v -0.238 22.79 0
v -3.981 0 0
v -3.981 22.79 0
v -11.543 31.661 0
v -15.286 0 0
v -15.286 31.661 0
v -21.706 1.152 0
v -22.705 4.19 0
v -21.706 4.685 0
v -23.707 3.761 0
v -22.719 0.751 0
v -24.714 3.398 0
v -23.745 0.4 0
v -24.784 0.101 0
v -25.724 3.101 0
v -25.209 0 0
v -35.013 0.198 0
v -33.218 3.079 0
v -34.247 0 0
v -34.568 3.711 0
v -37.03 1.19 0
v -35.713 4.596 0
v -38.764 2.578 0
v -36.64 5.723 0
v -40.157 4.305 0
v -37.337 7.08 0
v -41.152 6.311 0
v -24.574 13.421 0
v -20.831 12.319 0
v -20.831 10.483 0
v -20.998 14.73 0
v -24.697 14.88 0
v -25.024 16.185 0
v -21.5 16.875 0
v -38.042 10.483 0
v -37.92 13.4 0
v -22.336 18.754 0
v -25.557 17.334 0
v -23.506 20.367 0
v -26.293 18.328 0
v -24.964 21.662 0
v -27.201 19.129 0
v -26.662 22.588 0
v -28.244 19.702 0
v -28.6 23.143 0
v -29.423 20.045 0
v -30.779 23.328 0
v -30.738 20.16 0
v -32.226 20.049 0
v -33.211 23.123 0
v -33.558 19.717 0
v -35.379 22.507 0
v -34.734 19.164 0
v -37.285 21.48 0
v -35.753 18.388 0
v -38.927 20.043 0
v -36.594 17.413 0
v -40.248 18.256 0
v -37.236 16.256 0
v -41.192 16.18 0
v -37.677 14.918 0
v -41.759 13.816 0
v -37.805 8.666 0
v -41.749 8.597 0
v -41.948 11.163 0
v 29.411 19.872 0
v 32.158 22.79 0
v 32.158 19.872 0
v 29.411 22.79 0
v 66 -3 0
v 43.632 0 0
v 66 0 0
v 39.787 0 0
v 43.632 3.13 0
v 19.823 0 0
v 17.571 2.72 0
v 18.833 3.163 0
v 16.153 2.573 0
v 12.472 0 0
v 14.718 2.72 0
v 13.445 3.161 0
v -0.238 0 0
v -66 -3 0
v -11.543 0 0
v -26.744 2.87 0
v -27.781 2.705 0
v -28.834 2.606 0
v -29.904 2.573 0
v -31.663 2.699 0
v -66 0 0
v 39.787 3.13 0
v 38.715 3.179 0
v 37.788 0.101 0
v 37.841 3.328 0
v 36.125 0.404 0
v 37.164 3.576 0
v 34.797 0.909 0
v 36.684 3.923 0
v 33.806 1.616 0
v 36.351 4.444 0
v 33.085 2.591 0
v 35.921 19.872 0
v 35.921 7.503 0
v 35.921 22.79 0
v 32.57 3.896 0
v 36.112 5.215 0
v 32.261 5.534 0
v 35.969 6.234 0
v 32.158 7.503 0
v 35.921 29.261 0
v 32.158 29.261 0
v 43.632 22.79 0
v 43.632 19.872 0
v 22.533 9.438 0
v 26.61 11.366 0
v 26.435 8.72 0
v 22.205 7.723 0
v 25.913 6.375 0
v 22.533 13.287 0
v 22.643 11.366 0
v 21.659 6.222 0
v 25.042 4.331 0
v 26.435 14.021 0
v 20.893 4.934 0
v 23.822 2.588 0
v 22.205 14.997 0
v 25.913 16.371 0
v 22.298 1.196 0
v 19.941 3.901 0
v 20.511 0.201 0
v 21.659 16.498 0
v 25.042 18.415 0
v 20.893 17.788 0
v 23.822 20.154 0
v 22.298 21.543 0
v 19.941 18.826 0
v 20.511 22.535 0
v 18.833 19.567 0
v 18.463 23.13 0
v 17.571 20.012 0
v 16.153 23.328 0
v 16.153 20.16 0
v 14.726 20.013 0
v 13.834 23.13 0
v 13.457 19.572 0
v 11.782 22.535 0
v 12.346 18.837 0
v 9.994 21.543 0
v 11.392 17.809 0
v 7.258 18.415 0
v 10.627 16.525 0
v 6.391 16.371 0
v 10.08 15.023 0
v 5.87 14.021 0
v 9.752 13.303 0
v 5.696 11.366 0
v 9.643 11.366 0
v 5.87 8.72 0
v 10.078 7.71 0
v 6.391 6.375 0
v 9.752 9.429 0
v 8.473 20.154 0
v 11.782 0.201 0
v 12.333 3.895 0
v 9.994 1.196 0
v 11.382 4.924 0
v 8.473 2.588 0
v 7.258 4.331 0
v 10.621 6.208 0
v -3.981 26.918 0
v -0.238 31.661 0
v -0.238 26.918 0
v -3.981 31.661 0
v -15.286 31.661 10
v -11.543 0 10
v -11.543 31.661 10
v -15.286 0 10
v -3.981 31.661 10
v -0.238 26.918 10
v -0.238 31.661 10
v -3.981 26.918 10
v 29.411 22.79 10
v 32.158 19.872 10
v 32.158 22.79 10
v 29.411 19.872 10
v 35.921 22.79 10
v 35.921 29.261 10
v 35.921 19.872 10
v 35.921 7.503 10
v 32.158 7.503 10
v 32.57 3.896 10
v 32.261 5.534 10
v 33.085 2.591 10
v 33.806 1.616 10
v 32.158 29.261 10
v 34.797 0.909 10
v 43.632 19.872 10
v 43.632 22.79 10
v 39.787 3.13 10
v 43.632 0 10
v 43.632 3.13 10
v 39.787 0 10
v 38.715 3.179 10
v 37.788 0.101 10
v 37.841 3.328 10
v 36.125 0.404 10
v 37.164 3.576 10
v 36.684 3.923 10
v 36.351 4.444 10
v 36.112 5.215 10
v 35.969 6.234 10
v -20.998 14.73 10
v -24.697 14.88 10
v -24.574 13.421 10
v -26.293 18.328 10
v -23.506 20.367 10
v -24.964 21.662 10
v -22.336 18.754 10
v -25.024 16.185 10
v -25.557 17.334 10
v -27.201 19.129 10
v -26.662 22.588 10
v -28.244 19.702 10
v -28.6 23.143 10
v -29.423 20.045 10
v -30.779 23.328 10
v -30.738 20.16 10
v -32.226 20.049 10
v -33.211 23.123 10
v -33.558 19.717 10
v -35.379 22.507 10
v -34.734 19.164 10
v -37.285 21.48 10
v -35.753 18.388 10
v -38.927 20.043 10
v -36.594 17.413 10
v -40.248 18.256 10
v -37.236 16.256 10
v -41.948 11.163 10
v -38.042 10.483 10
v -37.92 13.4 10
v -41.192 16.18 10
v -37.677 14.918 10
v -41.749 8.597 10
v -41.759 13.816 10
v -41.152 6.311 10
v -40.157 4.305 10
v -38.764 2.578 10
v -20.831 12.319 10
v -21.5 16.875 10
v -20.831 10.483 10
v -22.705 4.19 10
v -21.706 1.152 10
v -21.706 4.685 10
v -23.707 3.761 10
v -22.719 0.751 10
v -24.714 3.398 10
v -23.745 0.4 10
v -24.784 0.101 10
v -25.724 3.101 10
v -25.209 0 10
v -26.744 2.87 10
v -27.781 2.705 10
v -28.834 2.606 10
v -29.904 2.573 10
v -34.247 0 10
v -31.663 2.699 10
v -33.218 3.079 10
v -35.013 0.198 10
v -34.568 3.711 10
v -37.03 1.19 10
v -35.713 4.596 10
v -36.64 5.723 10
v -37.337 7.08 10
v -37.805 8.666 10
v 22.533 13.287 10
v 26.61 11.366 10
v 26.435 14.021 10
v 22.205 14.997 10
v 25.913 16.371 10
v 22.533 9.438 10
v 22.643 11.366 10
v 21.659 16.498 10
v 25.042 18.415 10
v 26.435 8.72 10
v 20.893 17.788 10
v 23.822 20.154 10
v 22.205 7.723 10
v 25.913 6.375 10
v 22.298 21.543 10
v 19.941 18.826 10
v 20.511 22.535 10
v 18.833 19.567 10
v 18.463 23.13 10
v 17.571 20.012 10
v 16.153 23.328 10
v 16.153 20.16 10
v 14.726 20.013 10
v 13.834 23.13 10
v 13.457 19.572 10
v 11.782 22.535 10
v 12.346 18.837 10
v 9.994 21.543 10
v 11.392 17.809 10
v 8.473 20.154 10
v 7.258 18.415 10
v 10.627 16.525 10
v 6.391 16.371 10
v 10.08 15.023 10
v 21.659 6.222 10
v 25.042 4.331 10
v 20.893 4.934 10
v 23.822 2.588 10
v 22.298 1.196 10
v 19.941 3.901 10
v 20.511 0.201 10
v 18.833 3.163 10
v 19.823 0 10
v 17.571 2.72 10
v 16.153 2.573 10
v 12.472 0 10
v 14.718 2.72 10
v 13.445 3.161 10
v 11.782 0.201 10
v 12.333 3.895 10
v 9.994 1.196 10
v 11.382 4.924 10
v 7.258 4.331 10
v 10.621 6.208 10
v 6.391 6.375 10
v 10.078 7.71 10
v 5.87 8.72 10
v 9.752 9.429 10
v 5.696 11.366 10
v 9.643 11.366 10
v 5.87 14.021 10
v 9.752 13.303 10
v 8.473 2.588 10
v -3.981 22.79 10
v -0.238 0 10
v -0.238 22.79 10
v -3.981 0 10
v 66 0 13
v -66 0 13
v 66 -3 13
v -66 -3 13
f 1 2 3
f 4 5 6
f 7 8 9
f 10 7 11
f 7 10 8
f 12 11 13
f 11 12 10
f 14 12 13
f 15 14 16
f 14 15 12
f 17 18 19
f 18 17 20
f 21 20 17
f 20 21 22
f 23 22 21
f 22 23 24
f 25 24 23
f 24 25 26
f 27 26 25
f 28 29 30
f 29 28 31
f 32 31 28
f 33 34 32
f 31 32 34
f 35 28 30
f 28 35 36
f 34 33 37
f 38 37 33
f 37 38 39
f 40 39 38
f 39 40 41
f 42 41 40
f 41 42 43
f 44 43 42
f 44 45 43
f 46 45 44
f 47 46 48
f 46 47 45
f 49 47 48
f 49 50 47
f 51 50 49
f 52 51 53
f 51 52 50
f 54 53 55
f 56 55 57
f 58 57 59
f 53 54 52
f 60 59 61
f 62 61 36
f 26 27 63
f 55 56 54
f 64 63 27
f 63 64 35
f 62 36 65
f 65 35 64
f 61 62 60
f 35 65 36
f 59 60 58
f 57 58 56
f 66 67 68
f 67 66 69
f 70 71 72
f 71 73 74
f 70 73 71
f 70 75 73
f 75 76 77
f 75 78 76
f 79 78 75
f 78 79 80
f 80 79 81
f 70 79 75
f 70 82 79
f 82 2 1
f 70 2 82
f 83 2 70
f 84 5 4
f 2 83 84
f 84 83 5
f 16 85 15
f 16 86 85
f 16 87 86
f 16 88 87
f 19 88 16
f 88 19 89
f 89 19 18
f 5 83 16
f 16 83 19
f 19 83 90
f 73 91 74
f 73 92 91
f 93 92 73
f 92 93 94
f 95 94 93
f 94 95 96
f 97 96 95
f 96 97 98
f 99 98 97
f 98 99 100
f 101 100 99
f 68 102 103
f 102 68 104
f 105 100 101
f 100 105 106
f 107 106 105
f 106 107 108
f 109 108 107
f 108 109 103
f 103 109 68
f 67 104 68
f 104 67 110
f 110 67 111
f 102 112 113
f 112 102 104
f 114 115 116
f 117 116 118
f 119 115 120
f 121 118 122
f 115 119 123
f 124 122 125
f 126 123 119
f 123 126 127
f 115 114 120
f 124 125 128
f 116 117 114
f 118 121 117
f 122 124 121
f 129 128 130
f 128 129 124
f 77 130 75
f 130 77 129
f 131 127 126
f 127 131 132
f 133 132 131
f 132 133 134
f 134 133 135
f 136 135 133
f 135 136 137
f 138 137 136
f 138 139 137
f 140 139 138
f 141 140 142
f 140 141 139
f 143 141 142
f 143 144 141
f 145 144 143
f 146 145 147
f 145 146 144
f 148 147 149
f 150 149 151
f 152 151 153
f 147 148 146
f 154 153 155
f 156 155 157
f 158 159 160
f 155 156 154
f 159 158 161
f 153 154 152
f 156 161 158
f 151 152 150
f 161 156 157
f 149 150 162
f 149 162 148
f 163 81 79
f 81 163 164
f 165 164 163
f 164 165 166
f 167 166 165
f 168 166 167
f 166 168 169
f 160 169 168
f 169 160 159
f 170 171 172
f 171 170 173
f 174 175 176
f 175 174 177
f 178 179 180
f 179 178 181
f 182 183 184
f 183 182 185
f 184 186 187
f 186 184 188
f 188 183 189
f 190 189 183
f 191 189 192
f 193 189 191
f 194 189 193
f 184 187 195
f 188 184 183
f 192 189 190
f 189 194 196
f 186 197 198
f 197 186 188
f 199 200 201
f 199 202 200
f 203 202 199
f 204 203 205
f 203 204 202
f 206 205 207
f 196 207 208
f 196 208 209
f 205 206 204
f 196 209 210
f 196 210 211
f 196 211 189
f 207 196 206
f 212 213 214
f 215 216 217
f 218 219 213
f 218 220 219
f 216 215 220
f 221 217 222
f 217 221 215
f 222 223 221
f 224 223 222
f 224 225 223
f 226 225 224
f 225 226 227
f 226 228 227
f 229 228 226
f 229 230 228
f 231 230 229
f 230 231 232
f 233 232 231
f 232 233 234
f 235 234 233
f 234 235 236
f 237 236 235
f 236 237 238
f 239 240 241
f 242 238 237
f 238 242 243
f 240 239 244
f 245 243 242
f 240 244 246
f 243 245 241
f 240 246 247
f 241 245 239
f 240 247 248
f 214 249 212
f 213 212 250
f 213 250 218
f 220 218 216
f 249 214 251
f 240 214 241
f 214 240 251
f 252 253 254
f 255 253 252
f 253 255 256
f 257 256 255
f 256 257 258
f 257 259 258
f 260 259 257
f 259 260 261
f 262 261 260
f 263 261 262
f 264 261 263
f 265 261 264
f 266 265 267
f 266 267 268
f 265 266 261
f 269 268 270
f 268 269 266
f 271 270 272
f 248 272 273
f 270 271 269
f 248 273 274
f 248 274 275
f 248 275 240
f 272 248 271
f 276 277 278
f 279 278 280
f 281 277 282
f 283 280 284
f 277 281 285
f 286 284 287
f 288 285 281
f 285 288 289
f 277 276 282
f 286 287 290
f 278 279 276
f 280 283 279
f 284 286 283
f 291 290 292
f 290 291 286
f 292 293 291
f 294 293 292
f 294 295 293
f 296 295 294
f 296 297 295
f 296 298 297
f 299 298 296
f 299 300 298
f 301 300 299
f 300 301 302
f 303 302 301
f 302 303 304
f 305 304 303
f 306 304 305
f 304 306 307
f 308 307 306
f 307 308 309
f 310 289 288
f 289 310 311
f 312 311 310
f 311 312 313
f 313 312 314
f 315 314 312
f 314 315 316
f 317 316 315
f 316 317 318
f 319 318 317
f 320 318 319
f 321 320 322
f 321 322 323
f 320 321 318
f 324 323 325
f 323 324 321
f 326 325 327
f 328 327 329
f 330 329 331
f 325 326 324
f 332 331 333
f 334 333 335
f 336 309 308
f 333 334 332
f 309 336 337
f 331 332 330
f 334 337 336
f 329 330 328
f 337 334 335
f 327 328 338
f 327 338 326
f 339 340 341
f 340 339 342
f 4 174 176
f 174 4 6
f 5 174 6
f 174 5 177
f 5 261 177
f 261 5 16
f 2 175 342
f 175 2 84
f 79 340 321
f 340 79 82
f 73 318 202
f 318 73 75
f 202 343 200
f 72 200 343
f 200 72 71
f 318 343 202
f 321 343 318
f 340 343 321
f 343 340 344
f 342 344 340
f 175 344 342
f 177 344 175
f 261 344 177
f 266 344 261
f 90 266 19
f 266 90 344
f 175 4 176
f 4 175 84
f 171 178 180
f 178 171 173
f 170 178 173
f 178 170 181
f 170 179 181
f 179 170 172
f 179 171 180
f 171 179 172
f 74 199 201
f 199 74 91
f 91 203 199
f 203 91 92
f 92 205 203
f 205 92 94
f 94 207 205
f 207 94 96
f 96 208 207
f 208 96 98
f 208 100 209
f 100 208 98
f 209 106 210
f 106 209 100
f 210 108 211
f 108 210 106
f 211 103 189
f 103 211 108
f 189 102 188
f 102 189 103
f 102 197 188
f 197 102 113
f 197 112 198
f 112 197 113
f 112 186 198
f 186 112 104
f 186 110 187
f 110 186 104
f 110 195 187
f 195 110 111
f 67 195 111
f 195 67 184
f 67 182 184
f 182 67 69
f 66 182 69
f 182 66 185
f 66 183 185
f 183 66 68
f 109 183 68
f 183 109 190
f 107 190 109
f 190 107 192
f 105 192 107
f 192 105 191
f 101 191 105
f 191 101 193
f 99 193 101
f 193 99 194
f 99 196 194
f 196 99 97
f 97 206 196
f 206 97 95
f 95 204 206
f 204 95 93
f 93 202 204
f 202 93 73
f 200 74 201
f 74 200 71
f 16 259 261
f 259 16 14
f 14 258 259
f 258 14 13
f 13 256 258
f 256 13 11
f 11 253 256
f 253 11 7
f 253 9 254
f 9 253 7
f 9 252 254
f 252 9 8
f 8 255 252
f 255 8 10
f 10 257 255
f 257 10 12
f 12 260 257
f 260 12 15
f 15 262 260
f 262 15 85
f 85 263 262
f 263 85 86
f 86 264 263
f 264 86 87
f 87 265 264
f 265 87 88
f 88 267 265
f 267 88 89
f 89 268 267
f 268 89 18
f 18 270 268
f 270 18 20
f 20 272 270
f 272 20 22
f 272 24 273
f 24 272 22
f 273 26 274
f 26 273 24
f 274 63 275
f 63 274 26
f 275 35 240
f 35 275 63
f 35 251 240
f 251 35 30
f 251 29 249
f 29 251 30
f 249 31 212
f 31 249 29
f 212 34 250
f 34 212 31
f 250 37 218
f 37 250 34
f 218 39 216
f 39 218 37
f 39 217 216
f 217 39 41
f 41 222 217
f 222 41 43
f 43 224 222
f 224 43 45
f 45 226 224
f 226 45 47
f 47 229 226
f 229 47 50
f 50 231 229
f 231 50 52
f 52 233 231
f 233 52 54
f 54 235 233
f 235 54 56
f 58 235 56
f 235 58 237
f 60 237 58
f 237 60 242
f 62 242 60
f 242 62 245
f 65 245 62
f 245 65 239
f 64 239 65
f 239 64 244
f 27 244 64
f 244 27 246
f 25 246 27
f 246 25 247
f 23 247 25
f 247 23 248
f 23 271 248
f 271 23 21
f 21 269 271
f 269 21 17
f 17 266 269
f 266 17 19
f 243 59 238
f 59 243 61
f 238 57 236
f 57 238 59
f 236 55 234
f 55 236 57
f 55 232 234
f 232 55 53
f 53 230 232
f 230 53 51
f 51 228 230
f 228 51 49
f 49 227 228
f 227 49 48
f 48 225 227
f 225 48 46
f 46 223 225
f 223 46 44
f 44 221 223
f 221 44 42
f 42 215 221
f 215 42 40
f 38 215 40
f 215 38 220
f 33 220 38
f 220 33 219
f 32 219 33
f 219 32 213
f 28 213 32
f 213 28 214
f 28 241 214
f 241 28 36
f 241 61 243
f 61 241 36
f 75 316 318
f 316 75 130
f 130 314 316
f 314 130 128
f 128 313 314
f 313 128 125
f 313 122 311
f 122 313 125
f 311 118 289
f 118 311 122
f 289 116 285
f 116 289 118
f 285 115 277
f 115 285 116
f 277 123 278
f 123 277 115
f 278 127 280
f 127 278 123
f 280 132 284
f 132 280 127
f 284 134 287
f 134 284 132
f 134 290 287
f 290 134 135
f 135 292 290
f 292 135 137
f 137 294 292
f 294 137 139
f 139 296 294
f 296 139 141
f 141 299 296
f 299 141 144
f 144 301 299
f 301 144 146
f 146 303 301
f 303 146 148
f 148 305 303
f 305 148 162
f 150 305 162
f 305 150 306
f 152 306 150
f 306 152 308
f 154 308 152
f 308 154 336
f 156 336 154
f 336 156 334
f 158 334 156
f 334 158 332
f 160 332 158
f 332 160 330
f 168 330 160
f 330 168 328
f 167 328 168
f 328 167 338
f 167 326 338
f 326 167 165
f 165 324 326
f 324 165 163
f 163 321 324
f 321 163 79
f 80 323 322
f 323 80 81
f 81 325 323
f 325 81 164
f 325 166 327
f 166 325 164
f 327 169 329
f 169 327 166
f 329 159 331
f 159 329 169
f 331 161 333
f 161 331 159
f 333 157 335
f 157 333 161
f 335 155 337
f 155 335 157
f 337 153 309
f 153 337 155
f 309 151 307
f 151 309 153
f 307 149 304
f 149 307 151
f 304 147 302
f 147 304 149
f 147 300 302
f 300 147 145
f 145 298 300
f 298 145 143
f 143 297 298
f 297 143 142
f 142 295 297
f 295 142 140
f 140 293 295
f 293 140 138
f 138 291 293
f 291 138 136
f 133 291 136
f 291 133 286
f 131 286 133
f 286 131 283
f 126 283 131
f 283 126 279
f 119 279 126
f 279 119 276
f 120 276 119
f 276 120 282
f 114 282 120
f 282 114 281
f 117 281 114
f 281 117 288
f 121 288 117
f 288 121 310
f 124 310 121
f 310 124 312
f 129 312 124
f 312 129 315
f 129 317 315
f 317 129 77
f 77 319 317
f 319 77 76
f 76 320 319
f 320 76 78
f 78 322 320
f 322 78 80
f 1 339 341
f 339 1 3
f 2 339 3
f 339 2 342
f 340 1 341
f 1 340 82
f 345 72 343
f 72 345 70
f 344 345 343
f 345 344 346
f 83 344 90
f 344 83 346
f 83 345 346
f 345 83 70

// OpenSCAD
// file: Minecraft_Name.scad
module Minecraft_Name(text, font_size=30, extrude_height=10, extra_base=3, adjust_base_width=0, texture_width=1.6, texture_depth=0.4)
{
    nb_char = len(text);
    color("LimeGreen")
    
    union() {
        linear_extrude(height=extrude_height)
          text(text=text, size=font_size, font="Minecrafter", halign="center");
        translate([0, -extra_base/2, (extrude_height+extra_base)/2])
          cube(size=[nb_char*font_size+adjust_base_width, extra_base, extrude_height+extra_base], center=true);
    }
}
// main file
use <Minecraft_Name.scad>;

Minecraft_Name("eliot", font_size=30, extra_base=3, adjust_base_width=-18, texture_depth=0.5);
